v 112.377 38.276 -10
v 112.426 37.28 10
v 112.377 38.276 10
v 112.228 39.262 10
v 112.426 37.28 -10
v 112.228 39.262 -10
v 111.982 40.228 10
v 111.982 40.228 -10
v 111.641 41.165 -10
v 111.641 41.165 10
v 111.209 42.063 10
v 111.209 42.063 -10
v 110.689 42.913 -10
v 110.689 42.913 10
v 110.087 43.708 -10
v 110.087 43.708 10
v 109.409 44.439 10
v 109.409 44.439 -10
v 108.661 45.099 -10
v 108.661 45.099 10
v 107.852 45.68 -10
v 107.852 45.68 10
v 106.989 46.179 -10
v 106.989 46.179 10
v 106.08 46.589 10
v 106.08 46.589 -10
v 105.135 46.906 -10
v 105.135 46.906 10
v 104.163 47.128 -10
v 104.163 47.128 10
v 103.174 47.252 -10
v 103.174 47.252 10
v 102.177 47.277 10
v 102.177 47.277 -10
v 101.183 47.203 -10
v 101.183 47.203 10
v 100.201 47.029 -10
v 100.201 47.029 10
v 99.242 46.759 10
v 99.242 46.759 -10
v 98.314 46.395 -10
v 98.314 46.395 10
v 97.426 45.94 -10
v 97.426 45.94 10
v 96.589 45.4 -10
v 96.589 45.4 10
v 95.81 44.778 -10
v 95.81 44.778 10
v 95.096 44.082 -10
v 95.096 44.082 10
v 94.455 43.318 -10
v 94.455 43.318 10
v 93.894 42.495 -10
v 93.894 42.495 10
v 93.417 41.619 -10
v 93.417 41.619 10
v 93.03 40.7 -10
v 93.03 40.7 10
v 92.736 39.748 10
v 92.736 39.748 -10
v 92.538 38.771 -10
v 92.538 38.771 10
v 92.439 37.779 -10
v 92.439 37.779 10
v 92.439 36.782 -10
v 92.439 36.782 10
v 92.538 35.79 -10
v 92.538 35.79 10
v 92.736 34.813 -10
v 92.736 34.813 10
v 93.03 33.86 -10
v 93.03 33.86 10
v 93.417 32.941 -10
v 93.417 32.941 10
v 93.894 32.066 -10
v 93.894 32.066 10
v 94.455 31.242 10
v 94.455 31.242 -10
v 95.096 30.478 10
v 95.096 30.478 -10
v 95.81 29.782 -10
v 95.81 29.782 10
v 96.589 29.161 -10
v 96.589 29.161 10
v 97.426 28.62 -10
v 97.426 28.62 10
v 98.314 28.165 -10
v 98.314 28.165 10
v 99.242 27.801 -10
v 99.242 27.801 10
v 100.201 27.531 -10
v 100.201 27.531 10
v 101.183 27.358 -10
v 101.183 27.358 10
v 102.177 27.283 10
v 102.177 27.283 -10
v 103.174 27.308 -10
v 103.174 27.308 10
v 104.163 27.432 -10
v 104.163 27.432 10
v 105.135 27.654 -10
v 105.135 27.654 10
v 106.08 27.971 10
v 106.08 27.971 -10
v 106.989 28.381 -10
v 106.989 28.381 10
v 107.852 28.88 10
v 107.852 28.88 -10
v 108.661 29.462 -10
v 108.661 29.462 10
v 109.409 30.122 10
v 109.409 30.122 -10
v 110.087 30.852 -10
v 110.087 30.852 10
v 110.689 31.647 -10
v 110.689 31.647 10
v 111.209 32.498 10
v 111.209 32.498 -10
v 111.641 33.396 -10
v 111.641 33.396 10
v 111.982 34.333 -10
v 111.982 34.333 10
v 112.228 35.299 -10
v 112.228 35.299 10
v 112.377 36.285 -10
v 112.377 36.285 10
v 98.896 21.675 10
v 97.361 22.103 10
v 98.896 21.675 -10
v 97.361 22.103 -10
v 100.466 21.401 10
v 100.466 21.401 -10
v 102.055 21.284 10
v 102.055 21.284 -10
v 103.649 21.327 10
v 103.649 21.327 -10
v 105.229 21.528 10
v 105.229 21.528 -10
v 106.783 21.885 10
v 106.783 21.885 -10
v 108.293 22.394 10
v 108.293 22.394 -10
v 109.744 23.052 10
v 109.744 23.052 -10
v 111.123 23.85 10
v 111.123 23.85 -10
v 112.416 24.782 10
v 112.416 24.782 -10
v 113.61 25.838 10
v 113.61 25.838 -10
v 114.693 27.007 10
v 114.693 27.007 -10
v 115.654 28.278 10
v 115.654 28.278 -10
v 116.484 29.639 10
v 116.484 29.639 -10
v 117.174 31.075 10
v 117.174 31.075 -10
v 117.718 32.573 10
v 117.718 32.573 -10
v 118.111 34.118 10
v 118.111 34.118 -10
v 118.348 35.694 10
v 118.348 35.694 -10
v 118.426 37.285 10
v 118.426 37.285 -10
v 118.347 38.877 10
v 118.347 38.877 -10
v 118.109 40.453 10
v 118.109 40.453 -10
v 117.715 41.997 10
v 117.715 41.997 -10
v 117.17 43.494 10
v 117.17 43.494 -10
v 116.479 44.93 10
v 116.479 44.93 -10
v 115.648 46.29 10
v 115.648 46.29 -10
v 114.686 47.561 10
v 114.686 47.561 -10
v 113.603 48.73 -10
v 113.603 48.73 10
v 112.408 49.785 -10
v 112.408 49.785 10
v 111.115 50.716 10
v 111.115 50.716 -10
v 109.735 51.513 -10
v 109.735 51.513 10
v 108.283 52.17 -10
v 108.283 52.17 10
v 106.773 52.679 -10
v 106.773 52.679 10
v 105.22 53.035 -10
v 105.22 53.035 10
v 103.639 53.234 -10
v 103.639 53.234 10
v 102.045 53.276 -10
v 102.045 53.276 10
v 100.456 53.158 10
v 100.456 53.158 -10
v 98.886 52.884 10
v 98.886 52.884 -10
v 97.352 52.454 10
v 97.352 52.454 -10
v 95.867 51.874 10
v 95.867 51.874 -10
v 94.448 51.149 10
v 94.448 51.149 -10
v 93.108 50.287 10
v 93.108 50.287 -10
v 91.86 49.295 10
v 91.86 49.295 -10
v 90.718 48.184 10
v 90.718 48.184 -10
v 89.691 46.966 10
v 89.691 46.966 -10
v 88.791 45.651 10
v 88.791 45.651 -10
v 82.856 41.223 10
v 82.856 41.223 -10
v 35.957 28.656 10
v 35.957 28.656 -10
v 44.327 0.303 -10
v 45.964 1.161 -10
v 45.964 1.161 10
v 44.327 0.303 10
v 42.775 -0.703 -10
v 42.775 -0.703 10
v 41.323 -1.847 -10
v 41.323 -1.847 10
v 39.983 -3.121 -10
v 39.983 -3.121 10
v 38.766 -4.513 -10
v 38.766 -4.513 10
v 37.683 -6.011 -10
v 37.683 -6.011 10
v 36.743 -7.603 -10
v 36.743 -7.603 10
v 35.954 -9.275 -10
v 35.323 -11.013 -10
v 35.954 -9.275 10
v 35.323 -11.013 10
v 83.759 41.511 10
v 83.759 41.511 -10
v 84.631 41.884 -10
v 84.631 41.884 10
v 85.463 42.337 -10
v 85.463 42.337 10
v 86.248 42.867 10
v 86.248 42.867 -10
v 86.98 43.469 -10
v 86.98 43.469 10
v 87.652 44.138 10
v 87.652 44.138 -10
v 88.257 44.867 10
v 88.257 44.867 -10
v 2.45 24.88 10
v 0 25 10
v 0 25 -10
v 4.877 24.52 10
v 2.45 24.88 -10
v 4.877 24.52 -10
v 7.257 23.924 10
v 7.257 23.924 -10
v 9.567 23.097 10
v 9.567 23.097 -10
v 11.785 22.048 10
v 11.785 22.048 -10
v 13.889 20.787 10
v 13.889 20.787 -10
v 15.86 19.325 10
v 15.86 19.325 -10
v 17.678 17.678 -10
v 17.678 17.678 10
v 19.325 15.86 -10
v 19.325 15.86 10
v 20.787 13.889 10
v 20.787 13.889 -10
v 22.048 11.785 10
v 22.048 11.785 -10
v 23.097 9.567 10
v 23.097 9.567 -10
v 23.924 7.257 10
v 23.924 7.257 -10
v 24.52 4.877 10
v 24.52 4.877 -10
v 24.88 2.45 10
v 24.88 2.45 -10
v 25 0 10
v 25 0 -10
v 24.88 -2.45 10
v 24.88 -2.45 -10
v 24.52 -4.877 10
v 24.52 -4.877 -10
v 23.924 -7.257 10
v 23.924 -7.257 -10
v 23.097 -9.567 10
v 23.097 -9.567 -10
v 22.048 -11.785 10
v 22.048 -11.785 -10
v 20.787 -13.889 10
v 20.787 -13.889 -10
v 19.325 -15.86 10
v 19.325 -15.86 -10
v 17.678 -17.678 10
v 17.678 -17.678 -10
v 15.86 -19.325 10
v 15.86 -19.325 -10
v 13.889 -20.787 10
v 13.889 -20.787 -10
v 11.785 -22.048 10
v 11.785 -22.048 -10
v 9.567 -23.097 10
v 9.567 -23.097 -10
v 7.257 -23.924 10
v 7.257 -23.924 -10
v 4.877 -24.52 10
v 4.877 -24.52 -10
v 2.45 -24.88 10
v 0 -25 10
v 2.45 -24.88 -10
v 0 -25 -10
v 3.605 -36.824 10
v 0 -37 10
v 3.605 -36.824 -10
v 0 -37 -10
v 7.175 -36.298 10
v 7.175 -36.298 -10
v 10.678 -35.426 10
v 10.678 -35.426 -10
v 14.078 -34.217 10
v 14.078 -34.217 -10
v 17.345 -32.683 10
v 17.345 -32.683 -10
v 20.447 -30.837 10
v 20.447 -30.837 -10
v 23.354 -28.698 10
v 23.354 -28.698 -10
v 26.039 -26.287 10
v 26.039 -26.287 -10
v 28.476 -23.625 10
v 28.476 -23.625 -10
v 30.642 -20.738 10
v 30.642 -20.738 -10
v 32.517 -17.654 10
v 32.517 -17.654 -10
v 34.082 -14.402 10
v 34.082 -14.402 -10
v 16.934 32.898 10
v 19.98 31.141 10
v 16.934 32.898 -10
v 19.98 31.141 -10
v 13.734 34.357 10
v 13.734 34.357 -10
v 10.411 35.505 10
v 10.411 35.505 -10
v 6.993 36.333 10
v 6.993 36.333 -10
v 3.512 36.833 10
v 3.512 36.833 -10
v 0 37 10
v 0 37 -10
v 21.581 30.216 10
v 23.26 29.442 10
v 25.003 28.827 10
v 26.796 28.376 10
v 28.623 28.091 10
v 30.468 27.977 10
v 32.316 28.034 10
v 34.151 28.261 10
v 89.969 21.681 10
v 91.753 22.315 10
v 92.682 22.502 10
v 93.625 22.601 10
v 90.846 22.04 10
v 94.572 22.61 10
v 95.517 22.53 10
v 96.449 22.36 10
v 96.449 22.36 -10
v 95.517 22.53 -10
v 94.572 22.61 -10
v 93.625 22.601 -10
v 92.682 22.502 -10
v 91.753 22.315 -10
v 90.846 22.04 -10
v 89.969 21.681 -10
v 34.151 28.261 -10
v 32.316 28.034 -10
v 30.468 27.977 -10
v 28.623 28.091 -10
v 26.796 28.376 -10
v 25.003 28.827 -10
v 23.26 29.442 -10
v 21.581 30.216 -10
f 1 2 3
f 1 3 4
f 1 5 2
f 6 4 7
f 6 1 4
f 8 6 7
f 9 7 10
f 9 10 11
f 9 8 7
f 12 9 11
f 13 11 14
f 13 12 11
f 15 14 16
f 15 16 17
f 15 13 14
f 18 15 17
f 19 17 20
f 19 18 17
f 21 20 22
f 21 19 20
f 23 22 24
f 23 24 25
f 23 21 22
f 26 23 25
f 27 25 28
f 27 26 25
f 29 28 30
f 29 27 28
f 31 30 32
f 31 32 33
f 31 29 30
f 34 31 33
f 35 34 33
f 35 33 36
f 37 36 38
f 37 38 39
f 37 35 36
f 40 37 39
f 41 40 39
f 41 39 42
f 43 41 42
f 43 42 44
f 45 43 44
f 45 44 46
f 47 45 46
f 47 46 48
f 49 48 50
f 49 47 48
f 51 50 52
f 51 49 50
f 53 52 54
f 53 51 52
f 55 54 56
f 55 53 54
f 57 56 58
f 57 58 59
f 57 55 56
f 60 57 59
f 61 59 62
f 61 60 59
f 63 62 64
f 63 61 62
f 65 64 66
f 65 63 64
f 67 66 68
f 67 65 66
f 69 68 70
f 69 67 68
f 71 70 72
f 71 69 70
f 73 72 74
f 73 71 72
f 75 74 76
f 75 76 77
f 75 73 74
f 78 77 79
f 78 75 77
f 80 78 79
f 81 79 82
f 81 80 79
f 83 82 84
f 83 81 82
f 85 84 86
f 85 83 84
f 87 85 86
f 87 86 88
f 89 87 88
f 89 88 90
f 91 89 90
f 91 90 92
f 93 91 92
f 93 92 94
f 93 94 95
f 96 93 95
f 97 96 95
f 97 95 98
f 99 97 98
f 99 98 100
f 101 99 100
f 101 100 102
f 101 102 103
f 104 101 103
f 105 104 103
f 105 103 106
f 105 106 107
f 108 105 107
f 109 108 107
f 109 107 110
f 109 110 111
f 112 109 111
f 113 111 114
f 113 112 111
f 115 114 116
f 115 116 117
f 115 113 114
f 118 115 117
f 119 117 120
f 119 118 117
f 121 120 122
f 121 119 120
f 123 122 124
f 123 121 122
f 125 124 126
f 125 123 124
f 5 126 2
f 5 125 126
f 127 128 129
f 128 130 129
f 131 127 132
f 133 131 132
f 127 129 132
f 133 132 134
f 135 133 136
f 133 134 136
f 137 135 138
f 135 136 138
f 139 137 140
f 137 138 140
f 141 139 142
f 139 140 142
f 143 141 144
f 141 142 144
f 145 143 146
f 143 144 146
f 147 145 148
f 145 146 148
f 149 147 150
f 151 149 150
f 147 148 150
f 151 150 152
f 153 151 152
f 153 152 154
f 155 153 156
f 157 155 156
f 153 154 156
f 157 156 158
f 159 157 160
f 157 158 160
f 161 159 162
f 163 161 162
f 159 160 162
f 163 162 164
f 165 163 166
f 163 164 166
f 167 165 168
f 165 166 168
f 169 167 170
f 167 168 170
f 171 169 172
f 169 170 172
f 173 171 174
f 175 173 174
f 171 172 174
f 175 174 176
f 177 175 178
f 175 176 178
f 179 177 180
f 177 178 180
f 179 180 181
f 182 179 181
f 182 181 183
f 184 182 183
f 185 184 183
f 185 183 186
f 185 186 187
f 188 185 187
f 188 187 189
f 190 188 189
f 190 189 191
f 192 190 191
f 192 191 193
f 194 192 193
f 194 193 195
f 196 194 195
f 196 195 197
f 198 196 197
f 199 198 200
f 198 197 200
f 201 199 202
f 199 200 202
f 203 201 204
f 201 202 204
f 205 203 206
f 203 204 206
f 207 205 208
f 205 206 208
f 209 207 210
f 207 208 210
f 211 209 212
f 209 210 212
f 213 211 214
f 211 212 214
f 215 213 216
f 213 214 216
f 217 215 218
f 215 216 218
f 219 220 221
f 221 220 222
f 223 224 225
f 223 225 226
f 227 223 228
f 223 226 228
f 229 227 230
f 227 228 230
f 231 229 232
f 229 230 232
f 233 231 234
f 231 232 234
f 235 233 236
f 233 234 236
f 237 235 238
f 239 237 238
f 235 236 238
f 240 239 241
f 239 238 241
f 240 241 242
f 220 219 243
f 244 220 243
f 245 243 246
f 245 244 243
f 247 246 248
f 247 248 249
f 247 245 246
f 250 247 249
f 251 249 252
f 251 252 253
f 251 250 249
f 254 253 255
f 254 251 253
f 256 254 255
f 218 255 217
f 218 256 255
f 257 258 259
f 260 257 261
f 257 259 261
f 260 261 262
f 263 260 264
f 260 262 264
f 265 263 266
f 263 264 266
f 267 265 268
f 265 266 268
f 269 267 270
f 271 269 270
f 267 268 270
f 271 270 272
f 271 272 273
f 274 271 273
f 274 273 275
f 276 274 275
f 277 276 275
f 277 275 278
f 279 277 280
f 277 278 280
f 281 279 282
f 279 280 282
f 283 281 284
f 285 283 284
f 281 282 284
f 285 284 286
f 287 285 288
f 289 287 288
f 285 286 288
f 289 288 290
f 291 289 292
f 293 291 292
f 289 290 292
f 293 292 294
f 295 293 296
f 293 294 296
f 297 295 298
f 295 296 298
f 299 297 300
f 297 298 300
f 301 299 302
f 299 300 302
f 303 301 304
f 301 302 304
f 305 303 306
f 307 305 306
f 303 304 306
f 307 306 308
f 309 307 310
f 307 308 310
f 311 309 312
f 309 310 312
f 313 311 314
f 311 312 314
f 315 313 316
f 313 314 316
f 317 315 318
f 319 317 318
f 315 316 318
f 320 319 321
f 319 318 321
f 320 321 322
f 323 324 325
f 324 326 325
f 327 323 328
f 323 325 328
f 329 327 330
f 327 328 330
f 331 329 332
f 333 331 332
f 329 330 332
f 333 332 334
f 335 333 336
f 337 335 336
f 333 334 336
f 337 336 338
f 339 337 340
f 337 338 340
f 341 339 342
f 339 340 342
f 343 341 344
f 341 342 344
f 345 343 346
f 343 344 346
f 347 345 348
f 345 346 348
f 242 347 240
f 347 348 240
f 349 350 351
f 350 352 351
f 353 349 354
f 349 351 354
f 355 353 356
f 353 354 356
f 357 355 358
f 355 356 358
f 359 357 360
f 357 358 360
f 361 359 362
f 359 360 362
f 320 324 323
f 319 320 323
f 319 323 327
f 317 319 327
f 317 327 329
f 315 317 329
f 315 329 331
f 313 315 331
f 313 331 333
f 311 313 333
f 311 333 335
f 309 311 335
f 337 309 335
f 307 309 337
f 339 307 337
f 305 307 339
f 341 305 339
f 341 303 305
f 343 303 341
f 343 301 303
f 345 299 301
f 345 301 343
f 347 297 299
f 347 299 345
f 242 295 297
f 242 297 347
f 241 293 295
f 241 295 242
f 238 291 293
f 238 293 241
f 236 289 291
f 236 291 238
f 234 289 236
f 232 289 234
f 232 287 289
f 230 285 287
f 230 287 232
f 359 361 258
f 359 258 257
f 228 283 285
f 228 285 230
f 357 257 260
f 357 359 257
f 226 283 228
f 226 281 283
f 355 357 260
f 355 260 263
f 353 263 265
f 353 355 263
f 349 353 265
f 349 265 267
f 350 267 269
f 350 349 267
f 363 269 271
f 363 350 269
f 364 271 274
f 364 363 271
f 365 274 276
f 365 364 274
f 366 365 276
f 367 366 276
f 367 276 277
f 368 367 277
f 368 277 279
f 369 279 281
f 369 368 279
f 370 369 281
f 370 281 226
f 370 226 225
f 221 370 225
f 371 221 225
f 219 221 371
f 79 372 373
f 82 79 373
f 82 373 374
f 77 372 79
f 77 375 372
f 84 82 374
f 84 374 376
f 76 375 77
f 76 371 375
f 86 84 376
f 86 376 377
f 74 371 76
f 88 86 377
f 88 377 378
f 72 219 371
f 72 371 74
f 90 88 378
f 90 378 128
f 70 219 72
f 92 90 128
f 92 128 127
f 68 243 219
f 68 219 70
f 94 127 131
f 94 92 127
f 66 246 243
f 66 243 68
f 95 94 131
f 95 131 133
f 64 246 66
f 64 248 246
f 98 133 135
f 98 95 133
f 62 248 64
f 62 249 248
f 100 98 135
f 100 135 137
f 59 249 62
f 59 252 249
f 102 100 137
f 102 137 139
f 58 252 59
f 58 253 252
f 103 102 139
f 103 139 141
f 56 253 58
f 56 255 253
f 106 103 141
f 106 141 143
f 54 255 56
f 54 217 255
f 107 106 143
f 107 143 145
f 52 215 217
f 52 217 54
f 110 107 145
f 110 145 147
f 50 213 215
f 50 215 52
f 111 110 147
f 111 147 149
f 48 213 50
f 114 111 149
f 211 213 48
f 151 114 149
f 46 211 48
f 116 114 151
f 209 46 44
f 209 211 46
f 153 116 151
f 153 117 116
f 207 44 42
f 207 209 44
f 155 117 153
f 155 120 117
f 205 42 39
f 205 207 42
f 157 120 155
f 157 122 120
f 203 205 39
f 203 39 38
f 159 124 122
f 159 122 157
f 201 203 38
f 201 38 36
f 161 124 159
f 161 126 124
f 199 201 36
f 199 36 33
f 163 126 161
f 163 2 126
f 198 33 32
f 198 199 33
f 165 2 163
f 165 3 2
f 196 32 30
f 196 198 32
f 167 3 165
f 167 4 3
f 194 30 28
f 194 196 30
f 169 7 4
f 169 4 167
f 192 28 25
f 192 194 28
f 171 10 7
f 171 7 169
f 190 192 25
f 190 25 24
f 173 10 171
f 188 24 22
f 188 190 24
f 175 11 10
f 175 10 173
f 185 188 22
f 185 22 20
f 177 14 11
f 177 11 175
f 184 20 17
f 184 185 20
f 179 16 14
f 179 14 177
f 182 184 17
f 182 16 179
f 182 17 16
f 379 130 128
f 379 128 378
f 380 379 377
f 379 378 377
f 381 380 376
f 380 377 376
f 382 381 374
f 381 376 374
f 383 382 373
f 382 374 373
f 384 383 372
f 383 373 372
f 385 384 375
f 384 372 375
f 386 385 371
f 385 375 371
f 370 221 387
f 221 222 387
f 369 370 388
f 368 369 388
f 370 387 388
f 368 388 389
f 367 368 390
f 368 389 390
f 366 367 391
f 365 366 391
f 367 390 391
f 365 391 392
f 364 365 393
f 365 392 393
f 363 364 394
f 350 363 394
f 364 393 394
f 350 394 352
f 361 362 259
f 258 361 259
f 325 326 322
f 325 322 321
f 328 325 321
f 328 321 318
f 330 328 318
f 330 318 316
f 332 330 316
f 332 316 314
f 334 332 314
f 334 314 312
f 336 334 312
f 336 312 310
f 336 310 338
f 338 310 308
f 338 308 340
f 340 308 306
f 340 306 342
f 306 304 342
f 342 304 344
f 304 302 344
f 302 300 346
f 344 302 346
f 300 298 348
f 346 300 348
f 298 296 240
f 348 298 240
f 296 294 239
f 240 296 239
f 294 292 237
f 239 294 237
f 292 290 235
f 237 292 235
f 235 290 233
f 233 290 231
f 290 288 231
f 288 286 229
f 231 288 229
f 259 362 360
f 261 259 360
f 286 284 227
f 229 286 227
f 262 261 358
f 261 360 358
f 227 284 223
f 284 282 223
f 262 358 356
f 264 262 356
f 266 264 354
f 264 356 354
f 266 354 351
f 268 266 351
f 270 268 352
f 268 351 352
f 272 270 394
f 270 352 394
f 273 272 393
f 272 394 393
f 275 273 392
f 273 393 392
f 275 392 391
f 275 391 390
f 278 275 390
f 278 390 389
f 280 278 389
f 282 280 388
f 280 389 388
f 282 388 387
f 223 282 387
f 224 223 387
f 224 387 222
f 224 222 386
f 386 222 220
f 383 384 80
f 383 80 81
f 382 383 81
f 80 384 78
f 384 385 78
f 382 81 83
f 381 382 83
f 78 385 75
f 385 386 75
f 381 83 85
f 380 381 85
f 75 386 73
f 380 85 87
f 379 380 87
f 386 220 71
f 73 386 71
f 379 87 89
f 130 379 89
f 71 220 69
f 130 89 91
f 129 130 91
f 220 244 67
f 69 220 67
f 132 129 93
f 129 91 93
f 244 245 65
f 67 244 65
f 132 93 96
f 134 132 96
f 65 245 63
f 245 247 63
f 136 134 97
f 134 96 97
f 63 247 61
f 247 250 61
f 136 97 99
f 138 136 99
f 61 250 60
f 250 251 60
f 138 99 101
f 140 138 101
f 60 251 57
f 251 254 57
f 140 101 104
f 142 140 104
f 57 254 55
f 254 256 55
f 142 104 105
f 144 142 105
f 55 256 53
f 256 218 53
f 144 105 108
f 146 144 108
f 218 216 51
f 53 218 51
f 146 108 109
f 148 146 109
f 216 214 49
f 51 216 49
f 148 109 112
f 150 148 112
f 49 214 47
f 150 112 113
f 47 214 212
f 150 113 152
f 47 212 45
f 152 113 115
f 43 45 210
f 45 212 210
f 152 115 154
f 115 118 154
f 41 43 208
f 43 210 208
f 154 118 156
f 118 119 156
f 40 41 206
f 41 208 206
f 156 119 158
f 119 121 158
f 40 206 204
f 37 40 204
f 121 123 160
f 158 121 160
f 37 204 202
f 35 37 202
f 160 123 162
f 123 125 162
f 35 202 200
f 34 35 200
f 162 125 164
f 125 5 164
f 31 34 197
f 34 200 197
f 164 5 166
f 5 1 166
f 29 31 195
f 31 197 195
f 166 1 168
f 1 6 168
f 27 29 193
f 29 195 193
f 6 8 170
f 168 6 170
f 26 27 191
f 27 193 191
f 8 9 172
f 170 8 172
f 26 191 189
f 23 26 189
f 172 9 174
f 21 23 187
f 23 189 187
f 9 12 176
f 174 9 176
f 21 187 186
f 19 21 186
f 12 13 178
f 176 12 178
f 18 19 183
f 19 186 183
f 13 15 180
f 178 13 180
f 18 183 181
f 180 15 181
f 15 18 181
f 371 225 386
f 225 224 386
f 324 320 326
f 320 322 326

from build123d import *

# Parameters (mm, degrees)
F0_R          = 10
F1_DEPTH      = 10
F1_DEPTH_BACK = 10
F2_R          = 20
F3_R          = 10


with BuildPart() as f1:
    # F0 (on Top) → F1 (new body, two sides)
    with BuildSketch(Plane.XY) as f1_sk:
        with BuildLine():
            ThreePointArc((0, 25), (25, 0), (0, -25))
            Line((0, -25), (0, -37))
            ThreePointArc((0, -37), (25.050639293, -27.2298635878), (36.8716481479, -3.0792146493))
            Line((36.8716481479, -3.0792146493), (94.1099400271, 23.6114391937))
            ThreePointArc((94.1099400271, 23.6114391937), (117.4615775982, 42.7525179157), (87.2695371606, 42.4052916094))
            Line((87.2695371606, 42.4052916094), (26.2660401482, 26.0594538495))
            ThreePointArc((26.2660401482, 26.0594538495), (14.2267390426, 34.1555251199), (0, 37))
            Line((0, 37), (0, 25))
        make_face()
        with Locations((102.4264956657, 37.2801956225)):
            Circle(F0_R, mode=Mode.SUBTRACT)
    extrude(amount=-F1_DEPTH)
    extrude(f1_sk.sketch, amount=F1_DEPTH_BACK)

    # F2
    f2_edges = [f1.edges().sort_by_distance(p)[0] for p in [
        (26.26604, 26.059454, 0),
        (36.871648, -3.079215, 0),
    ]]
    fillet(f2_edges, radius=F2_R)

    # F3
    f3_edges = [f1.edges().sort_by_distance(p)[0] for p in [
        (87.269537, 42.405292, 0),
        (94.10994, 23.611439, 0),
    ]]
    fillet(f3_edges, radius=F3_R)


solid = f1.part
